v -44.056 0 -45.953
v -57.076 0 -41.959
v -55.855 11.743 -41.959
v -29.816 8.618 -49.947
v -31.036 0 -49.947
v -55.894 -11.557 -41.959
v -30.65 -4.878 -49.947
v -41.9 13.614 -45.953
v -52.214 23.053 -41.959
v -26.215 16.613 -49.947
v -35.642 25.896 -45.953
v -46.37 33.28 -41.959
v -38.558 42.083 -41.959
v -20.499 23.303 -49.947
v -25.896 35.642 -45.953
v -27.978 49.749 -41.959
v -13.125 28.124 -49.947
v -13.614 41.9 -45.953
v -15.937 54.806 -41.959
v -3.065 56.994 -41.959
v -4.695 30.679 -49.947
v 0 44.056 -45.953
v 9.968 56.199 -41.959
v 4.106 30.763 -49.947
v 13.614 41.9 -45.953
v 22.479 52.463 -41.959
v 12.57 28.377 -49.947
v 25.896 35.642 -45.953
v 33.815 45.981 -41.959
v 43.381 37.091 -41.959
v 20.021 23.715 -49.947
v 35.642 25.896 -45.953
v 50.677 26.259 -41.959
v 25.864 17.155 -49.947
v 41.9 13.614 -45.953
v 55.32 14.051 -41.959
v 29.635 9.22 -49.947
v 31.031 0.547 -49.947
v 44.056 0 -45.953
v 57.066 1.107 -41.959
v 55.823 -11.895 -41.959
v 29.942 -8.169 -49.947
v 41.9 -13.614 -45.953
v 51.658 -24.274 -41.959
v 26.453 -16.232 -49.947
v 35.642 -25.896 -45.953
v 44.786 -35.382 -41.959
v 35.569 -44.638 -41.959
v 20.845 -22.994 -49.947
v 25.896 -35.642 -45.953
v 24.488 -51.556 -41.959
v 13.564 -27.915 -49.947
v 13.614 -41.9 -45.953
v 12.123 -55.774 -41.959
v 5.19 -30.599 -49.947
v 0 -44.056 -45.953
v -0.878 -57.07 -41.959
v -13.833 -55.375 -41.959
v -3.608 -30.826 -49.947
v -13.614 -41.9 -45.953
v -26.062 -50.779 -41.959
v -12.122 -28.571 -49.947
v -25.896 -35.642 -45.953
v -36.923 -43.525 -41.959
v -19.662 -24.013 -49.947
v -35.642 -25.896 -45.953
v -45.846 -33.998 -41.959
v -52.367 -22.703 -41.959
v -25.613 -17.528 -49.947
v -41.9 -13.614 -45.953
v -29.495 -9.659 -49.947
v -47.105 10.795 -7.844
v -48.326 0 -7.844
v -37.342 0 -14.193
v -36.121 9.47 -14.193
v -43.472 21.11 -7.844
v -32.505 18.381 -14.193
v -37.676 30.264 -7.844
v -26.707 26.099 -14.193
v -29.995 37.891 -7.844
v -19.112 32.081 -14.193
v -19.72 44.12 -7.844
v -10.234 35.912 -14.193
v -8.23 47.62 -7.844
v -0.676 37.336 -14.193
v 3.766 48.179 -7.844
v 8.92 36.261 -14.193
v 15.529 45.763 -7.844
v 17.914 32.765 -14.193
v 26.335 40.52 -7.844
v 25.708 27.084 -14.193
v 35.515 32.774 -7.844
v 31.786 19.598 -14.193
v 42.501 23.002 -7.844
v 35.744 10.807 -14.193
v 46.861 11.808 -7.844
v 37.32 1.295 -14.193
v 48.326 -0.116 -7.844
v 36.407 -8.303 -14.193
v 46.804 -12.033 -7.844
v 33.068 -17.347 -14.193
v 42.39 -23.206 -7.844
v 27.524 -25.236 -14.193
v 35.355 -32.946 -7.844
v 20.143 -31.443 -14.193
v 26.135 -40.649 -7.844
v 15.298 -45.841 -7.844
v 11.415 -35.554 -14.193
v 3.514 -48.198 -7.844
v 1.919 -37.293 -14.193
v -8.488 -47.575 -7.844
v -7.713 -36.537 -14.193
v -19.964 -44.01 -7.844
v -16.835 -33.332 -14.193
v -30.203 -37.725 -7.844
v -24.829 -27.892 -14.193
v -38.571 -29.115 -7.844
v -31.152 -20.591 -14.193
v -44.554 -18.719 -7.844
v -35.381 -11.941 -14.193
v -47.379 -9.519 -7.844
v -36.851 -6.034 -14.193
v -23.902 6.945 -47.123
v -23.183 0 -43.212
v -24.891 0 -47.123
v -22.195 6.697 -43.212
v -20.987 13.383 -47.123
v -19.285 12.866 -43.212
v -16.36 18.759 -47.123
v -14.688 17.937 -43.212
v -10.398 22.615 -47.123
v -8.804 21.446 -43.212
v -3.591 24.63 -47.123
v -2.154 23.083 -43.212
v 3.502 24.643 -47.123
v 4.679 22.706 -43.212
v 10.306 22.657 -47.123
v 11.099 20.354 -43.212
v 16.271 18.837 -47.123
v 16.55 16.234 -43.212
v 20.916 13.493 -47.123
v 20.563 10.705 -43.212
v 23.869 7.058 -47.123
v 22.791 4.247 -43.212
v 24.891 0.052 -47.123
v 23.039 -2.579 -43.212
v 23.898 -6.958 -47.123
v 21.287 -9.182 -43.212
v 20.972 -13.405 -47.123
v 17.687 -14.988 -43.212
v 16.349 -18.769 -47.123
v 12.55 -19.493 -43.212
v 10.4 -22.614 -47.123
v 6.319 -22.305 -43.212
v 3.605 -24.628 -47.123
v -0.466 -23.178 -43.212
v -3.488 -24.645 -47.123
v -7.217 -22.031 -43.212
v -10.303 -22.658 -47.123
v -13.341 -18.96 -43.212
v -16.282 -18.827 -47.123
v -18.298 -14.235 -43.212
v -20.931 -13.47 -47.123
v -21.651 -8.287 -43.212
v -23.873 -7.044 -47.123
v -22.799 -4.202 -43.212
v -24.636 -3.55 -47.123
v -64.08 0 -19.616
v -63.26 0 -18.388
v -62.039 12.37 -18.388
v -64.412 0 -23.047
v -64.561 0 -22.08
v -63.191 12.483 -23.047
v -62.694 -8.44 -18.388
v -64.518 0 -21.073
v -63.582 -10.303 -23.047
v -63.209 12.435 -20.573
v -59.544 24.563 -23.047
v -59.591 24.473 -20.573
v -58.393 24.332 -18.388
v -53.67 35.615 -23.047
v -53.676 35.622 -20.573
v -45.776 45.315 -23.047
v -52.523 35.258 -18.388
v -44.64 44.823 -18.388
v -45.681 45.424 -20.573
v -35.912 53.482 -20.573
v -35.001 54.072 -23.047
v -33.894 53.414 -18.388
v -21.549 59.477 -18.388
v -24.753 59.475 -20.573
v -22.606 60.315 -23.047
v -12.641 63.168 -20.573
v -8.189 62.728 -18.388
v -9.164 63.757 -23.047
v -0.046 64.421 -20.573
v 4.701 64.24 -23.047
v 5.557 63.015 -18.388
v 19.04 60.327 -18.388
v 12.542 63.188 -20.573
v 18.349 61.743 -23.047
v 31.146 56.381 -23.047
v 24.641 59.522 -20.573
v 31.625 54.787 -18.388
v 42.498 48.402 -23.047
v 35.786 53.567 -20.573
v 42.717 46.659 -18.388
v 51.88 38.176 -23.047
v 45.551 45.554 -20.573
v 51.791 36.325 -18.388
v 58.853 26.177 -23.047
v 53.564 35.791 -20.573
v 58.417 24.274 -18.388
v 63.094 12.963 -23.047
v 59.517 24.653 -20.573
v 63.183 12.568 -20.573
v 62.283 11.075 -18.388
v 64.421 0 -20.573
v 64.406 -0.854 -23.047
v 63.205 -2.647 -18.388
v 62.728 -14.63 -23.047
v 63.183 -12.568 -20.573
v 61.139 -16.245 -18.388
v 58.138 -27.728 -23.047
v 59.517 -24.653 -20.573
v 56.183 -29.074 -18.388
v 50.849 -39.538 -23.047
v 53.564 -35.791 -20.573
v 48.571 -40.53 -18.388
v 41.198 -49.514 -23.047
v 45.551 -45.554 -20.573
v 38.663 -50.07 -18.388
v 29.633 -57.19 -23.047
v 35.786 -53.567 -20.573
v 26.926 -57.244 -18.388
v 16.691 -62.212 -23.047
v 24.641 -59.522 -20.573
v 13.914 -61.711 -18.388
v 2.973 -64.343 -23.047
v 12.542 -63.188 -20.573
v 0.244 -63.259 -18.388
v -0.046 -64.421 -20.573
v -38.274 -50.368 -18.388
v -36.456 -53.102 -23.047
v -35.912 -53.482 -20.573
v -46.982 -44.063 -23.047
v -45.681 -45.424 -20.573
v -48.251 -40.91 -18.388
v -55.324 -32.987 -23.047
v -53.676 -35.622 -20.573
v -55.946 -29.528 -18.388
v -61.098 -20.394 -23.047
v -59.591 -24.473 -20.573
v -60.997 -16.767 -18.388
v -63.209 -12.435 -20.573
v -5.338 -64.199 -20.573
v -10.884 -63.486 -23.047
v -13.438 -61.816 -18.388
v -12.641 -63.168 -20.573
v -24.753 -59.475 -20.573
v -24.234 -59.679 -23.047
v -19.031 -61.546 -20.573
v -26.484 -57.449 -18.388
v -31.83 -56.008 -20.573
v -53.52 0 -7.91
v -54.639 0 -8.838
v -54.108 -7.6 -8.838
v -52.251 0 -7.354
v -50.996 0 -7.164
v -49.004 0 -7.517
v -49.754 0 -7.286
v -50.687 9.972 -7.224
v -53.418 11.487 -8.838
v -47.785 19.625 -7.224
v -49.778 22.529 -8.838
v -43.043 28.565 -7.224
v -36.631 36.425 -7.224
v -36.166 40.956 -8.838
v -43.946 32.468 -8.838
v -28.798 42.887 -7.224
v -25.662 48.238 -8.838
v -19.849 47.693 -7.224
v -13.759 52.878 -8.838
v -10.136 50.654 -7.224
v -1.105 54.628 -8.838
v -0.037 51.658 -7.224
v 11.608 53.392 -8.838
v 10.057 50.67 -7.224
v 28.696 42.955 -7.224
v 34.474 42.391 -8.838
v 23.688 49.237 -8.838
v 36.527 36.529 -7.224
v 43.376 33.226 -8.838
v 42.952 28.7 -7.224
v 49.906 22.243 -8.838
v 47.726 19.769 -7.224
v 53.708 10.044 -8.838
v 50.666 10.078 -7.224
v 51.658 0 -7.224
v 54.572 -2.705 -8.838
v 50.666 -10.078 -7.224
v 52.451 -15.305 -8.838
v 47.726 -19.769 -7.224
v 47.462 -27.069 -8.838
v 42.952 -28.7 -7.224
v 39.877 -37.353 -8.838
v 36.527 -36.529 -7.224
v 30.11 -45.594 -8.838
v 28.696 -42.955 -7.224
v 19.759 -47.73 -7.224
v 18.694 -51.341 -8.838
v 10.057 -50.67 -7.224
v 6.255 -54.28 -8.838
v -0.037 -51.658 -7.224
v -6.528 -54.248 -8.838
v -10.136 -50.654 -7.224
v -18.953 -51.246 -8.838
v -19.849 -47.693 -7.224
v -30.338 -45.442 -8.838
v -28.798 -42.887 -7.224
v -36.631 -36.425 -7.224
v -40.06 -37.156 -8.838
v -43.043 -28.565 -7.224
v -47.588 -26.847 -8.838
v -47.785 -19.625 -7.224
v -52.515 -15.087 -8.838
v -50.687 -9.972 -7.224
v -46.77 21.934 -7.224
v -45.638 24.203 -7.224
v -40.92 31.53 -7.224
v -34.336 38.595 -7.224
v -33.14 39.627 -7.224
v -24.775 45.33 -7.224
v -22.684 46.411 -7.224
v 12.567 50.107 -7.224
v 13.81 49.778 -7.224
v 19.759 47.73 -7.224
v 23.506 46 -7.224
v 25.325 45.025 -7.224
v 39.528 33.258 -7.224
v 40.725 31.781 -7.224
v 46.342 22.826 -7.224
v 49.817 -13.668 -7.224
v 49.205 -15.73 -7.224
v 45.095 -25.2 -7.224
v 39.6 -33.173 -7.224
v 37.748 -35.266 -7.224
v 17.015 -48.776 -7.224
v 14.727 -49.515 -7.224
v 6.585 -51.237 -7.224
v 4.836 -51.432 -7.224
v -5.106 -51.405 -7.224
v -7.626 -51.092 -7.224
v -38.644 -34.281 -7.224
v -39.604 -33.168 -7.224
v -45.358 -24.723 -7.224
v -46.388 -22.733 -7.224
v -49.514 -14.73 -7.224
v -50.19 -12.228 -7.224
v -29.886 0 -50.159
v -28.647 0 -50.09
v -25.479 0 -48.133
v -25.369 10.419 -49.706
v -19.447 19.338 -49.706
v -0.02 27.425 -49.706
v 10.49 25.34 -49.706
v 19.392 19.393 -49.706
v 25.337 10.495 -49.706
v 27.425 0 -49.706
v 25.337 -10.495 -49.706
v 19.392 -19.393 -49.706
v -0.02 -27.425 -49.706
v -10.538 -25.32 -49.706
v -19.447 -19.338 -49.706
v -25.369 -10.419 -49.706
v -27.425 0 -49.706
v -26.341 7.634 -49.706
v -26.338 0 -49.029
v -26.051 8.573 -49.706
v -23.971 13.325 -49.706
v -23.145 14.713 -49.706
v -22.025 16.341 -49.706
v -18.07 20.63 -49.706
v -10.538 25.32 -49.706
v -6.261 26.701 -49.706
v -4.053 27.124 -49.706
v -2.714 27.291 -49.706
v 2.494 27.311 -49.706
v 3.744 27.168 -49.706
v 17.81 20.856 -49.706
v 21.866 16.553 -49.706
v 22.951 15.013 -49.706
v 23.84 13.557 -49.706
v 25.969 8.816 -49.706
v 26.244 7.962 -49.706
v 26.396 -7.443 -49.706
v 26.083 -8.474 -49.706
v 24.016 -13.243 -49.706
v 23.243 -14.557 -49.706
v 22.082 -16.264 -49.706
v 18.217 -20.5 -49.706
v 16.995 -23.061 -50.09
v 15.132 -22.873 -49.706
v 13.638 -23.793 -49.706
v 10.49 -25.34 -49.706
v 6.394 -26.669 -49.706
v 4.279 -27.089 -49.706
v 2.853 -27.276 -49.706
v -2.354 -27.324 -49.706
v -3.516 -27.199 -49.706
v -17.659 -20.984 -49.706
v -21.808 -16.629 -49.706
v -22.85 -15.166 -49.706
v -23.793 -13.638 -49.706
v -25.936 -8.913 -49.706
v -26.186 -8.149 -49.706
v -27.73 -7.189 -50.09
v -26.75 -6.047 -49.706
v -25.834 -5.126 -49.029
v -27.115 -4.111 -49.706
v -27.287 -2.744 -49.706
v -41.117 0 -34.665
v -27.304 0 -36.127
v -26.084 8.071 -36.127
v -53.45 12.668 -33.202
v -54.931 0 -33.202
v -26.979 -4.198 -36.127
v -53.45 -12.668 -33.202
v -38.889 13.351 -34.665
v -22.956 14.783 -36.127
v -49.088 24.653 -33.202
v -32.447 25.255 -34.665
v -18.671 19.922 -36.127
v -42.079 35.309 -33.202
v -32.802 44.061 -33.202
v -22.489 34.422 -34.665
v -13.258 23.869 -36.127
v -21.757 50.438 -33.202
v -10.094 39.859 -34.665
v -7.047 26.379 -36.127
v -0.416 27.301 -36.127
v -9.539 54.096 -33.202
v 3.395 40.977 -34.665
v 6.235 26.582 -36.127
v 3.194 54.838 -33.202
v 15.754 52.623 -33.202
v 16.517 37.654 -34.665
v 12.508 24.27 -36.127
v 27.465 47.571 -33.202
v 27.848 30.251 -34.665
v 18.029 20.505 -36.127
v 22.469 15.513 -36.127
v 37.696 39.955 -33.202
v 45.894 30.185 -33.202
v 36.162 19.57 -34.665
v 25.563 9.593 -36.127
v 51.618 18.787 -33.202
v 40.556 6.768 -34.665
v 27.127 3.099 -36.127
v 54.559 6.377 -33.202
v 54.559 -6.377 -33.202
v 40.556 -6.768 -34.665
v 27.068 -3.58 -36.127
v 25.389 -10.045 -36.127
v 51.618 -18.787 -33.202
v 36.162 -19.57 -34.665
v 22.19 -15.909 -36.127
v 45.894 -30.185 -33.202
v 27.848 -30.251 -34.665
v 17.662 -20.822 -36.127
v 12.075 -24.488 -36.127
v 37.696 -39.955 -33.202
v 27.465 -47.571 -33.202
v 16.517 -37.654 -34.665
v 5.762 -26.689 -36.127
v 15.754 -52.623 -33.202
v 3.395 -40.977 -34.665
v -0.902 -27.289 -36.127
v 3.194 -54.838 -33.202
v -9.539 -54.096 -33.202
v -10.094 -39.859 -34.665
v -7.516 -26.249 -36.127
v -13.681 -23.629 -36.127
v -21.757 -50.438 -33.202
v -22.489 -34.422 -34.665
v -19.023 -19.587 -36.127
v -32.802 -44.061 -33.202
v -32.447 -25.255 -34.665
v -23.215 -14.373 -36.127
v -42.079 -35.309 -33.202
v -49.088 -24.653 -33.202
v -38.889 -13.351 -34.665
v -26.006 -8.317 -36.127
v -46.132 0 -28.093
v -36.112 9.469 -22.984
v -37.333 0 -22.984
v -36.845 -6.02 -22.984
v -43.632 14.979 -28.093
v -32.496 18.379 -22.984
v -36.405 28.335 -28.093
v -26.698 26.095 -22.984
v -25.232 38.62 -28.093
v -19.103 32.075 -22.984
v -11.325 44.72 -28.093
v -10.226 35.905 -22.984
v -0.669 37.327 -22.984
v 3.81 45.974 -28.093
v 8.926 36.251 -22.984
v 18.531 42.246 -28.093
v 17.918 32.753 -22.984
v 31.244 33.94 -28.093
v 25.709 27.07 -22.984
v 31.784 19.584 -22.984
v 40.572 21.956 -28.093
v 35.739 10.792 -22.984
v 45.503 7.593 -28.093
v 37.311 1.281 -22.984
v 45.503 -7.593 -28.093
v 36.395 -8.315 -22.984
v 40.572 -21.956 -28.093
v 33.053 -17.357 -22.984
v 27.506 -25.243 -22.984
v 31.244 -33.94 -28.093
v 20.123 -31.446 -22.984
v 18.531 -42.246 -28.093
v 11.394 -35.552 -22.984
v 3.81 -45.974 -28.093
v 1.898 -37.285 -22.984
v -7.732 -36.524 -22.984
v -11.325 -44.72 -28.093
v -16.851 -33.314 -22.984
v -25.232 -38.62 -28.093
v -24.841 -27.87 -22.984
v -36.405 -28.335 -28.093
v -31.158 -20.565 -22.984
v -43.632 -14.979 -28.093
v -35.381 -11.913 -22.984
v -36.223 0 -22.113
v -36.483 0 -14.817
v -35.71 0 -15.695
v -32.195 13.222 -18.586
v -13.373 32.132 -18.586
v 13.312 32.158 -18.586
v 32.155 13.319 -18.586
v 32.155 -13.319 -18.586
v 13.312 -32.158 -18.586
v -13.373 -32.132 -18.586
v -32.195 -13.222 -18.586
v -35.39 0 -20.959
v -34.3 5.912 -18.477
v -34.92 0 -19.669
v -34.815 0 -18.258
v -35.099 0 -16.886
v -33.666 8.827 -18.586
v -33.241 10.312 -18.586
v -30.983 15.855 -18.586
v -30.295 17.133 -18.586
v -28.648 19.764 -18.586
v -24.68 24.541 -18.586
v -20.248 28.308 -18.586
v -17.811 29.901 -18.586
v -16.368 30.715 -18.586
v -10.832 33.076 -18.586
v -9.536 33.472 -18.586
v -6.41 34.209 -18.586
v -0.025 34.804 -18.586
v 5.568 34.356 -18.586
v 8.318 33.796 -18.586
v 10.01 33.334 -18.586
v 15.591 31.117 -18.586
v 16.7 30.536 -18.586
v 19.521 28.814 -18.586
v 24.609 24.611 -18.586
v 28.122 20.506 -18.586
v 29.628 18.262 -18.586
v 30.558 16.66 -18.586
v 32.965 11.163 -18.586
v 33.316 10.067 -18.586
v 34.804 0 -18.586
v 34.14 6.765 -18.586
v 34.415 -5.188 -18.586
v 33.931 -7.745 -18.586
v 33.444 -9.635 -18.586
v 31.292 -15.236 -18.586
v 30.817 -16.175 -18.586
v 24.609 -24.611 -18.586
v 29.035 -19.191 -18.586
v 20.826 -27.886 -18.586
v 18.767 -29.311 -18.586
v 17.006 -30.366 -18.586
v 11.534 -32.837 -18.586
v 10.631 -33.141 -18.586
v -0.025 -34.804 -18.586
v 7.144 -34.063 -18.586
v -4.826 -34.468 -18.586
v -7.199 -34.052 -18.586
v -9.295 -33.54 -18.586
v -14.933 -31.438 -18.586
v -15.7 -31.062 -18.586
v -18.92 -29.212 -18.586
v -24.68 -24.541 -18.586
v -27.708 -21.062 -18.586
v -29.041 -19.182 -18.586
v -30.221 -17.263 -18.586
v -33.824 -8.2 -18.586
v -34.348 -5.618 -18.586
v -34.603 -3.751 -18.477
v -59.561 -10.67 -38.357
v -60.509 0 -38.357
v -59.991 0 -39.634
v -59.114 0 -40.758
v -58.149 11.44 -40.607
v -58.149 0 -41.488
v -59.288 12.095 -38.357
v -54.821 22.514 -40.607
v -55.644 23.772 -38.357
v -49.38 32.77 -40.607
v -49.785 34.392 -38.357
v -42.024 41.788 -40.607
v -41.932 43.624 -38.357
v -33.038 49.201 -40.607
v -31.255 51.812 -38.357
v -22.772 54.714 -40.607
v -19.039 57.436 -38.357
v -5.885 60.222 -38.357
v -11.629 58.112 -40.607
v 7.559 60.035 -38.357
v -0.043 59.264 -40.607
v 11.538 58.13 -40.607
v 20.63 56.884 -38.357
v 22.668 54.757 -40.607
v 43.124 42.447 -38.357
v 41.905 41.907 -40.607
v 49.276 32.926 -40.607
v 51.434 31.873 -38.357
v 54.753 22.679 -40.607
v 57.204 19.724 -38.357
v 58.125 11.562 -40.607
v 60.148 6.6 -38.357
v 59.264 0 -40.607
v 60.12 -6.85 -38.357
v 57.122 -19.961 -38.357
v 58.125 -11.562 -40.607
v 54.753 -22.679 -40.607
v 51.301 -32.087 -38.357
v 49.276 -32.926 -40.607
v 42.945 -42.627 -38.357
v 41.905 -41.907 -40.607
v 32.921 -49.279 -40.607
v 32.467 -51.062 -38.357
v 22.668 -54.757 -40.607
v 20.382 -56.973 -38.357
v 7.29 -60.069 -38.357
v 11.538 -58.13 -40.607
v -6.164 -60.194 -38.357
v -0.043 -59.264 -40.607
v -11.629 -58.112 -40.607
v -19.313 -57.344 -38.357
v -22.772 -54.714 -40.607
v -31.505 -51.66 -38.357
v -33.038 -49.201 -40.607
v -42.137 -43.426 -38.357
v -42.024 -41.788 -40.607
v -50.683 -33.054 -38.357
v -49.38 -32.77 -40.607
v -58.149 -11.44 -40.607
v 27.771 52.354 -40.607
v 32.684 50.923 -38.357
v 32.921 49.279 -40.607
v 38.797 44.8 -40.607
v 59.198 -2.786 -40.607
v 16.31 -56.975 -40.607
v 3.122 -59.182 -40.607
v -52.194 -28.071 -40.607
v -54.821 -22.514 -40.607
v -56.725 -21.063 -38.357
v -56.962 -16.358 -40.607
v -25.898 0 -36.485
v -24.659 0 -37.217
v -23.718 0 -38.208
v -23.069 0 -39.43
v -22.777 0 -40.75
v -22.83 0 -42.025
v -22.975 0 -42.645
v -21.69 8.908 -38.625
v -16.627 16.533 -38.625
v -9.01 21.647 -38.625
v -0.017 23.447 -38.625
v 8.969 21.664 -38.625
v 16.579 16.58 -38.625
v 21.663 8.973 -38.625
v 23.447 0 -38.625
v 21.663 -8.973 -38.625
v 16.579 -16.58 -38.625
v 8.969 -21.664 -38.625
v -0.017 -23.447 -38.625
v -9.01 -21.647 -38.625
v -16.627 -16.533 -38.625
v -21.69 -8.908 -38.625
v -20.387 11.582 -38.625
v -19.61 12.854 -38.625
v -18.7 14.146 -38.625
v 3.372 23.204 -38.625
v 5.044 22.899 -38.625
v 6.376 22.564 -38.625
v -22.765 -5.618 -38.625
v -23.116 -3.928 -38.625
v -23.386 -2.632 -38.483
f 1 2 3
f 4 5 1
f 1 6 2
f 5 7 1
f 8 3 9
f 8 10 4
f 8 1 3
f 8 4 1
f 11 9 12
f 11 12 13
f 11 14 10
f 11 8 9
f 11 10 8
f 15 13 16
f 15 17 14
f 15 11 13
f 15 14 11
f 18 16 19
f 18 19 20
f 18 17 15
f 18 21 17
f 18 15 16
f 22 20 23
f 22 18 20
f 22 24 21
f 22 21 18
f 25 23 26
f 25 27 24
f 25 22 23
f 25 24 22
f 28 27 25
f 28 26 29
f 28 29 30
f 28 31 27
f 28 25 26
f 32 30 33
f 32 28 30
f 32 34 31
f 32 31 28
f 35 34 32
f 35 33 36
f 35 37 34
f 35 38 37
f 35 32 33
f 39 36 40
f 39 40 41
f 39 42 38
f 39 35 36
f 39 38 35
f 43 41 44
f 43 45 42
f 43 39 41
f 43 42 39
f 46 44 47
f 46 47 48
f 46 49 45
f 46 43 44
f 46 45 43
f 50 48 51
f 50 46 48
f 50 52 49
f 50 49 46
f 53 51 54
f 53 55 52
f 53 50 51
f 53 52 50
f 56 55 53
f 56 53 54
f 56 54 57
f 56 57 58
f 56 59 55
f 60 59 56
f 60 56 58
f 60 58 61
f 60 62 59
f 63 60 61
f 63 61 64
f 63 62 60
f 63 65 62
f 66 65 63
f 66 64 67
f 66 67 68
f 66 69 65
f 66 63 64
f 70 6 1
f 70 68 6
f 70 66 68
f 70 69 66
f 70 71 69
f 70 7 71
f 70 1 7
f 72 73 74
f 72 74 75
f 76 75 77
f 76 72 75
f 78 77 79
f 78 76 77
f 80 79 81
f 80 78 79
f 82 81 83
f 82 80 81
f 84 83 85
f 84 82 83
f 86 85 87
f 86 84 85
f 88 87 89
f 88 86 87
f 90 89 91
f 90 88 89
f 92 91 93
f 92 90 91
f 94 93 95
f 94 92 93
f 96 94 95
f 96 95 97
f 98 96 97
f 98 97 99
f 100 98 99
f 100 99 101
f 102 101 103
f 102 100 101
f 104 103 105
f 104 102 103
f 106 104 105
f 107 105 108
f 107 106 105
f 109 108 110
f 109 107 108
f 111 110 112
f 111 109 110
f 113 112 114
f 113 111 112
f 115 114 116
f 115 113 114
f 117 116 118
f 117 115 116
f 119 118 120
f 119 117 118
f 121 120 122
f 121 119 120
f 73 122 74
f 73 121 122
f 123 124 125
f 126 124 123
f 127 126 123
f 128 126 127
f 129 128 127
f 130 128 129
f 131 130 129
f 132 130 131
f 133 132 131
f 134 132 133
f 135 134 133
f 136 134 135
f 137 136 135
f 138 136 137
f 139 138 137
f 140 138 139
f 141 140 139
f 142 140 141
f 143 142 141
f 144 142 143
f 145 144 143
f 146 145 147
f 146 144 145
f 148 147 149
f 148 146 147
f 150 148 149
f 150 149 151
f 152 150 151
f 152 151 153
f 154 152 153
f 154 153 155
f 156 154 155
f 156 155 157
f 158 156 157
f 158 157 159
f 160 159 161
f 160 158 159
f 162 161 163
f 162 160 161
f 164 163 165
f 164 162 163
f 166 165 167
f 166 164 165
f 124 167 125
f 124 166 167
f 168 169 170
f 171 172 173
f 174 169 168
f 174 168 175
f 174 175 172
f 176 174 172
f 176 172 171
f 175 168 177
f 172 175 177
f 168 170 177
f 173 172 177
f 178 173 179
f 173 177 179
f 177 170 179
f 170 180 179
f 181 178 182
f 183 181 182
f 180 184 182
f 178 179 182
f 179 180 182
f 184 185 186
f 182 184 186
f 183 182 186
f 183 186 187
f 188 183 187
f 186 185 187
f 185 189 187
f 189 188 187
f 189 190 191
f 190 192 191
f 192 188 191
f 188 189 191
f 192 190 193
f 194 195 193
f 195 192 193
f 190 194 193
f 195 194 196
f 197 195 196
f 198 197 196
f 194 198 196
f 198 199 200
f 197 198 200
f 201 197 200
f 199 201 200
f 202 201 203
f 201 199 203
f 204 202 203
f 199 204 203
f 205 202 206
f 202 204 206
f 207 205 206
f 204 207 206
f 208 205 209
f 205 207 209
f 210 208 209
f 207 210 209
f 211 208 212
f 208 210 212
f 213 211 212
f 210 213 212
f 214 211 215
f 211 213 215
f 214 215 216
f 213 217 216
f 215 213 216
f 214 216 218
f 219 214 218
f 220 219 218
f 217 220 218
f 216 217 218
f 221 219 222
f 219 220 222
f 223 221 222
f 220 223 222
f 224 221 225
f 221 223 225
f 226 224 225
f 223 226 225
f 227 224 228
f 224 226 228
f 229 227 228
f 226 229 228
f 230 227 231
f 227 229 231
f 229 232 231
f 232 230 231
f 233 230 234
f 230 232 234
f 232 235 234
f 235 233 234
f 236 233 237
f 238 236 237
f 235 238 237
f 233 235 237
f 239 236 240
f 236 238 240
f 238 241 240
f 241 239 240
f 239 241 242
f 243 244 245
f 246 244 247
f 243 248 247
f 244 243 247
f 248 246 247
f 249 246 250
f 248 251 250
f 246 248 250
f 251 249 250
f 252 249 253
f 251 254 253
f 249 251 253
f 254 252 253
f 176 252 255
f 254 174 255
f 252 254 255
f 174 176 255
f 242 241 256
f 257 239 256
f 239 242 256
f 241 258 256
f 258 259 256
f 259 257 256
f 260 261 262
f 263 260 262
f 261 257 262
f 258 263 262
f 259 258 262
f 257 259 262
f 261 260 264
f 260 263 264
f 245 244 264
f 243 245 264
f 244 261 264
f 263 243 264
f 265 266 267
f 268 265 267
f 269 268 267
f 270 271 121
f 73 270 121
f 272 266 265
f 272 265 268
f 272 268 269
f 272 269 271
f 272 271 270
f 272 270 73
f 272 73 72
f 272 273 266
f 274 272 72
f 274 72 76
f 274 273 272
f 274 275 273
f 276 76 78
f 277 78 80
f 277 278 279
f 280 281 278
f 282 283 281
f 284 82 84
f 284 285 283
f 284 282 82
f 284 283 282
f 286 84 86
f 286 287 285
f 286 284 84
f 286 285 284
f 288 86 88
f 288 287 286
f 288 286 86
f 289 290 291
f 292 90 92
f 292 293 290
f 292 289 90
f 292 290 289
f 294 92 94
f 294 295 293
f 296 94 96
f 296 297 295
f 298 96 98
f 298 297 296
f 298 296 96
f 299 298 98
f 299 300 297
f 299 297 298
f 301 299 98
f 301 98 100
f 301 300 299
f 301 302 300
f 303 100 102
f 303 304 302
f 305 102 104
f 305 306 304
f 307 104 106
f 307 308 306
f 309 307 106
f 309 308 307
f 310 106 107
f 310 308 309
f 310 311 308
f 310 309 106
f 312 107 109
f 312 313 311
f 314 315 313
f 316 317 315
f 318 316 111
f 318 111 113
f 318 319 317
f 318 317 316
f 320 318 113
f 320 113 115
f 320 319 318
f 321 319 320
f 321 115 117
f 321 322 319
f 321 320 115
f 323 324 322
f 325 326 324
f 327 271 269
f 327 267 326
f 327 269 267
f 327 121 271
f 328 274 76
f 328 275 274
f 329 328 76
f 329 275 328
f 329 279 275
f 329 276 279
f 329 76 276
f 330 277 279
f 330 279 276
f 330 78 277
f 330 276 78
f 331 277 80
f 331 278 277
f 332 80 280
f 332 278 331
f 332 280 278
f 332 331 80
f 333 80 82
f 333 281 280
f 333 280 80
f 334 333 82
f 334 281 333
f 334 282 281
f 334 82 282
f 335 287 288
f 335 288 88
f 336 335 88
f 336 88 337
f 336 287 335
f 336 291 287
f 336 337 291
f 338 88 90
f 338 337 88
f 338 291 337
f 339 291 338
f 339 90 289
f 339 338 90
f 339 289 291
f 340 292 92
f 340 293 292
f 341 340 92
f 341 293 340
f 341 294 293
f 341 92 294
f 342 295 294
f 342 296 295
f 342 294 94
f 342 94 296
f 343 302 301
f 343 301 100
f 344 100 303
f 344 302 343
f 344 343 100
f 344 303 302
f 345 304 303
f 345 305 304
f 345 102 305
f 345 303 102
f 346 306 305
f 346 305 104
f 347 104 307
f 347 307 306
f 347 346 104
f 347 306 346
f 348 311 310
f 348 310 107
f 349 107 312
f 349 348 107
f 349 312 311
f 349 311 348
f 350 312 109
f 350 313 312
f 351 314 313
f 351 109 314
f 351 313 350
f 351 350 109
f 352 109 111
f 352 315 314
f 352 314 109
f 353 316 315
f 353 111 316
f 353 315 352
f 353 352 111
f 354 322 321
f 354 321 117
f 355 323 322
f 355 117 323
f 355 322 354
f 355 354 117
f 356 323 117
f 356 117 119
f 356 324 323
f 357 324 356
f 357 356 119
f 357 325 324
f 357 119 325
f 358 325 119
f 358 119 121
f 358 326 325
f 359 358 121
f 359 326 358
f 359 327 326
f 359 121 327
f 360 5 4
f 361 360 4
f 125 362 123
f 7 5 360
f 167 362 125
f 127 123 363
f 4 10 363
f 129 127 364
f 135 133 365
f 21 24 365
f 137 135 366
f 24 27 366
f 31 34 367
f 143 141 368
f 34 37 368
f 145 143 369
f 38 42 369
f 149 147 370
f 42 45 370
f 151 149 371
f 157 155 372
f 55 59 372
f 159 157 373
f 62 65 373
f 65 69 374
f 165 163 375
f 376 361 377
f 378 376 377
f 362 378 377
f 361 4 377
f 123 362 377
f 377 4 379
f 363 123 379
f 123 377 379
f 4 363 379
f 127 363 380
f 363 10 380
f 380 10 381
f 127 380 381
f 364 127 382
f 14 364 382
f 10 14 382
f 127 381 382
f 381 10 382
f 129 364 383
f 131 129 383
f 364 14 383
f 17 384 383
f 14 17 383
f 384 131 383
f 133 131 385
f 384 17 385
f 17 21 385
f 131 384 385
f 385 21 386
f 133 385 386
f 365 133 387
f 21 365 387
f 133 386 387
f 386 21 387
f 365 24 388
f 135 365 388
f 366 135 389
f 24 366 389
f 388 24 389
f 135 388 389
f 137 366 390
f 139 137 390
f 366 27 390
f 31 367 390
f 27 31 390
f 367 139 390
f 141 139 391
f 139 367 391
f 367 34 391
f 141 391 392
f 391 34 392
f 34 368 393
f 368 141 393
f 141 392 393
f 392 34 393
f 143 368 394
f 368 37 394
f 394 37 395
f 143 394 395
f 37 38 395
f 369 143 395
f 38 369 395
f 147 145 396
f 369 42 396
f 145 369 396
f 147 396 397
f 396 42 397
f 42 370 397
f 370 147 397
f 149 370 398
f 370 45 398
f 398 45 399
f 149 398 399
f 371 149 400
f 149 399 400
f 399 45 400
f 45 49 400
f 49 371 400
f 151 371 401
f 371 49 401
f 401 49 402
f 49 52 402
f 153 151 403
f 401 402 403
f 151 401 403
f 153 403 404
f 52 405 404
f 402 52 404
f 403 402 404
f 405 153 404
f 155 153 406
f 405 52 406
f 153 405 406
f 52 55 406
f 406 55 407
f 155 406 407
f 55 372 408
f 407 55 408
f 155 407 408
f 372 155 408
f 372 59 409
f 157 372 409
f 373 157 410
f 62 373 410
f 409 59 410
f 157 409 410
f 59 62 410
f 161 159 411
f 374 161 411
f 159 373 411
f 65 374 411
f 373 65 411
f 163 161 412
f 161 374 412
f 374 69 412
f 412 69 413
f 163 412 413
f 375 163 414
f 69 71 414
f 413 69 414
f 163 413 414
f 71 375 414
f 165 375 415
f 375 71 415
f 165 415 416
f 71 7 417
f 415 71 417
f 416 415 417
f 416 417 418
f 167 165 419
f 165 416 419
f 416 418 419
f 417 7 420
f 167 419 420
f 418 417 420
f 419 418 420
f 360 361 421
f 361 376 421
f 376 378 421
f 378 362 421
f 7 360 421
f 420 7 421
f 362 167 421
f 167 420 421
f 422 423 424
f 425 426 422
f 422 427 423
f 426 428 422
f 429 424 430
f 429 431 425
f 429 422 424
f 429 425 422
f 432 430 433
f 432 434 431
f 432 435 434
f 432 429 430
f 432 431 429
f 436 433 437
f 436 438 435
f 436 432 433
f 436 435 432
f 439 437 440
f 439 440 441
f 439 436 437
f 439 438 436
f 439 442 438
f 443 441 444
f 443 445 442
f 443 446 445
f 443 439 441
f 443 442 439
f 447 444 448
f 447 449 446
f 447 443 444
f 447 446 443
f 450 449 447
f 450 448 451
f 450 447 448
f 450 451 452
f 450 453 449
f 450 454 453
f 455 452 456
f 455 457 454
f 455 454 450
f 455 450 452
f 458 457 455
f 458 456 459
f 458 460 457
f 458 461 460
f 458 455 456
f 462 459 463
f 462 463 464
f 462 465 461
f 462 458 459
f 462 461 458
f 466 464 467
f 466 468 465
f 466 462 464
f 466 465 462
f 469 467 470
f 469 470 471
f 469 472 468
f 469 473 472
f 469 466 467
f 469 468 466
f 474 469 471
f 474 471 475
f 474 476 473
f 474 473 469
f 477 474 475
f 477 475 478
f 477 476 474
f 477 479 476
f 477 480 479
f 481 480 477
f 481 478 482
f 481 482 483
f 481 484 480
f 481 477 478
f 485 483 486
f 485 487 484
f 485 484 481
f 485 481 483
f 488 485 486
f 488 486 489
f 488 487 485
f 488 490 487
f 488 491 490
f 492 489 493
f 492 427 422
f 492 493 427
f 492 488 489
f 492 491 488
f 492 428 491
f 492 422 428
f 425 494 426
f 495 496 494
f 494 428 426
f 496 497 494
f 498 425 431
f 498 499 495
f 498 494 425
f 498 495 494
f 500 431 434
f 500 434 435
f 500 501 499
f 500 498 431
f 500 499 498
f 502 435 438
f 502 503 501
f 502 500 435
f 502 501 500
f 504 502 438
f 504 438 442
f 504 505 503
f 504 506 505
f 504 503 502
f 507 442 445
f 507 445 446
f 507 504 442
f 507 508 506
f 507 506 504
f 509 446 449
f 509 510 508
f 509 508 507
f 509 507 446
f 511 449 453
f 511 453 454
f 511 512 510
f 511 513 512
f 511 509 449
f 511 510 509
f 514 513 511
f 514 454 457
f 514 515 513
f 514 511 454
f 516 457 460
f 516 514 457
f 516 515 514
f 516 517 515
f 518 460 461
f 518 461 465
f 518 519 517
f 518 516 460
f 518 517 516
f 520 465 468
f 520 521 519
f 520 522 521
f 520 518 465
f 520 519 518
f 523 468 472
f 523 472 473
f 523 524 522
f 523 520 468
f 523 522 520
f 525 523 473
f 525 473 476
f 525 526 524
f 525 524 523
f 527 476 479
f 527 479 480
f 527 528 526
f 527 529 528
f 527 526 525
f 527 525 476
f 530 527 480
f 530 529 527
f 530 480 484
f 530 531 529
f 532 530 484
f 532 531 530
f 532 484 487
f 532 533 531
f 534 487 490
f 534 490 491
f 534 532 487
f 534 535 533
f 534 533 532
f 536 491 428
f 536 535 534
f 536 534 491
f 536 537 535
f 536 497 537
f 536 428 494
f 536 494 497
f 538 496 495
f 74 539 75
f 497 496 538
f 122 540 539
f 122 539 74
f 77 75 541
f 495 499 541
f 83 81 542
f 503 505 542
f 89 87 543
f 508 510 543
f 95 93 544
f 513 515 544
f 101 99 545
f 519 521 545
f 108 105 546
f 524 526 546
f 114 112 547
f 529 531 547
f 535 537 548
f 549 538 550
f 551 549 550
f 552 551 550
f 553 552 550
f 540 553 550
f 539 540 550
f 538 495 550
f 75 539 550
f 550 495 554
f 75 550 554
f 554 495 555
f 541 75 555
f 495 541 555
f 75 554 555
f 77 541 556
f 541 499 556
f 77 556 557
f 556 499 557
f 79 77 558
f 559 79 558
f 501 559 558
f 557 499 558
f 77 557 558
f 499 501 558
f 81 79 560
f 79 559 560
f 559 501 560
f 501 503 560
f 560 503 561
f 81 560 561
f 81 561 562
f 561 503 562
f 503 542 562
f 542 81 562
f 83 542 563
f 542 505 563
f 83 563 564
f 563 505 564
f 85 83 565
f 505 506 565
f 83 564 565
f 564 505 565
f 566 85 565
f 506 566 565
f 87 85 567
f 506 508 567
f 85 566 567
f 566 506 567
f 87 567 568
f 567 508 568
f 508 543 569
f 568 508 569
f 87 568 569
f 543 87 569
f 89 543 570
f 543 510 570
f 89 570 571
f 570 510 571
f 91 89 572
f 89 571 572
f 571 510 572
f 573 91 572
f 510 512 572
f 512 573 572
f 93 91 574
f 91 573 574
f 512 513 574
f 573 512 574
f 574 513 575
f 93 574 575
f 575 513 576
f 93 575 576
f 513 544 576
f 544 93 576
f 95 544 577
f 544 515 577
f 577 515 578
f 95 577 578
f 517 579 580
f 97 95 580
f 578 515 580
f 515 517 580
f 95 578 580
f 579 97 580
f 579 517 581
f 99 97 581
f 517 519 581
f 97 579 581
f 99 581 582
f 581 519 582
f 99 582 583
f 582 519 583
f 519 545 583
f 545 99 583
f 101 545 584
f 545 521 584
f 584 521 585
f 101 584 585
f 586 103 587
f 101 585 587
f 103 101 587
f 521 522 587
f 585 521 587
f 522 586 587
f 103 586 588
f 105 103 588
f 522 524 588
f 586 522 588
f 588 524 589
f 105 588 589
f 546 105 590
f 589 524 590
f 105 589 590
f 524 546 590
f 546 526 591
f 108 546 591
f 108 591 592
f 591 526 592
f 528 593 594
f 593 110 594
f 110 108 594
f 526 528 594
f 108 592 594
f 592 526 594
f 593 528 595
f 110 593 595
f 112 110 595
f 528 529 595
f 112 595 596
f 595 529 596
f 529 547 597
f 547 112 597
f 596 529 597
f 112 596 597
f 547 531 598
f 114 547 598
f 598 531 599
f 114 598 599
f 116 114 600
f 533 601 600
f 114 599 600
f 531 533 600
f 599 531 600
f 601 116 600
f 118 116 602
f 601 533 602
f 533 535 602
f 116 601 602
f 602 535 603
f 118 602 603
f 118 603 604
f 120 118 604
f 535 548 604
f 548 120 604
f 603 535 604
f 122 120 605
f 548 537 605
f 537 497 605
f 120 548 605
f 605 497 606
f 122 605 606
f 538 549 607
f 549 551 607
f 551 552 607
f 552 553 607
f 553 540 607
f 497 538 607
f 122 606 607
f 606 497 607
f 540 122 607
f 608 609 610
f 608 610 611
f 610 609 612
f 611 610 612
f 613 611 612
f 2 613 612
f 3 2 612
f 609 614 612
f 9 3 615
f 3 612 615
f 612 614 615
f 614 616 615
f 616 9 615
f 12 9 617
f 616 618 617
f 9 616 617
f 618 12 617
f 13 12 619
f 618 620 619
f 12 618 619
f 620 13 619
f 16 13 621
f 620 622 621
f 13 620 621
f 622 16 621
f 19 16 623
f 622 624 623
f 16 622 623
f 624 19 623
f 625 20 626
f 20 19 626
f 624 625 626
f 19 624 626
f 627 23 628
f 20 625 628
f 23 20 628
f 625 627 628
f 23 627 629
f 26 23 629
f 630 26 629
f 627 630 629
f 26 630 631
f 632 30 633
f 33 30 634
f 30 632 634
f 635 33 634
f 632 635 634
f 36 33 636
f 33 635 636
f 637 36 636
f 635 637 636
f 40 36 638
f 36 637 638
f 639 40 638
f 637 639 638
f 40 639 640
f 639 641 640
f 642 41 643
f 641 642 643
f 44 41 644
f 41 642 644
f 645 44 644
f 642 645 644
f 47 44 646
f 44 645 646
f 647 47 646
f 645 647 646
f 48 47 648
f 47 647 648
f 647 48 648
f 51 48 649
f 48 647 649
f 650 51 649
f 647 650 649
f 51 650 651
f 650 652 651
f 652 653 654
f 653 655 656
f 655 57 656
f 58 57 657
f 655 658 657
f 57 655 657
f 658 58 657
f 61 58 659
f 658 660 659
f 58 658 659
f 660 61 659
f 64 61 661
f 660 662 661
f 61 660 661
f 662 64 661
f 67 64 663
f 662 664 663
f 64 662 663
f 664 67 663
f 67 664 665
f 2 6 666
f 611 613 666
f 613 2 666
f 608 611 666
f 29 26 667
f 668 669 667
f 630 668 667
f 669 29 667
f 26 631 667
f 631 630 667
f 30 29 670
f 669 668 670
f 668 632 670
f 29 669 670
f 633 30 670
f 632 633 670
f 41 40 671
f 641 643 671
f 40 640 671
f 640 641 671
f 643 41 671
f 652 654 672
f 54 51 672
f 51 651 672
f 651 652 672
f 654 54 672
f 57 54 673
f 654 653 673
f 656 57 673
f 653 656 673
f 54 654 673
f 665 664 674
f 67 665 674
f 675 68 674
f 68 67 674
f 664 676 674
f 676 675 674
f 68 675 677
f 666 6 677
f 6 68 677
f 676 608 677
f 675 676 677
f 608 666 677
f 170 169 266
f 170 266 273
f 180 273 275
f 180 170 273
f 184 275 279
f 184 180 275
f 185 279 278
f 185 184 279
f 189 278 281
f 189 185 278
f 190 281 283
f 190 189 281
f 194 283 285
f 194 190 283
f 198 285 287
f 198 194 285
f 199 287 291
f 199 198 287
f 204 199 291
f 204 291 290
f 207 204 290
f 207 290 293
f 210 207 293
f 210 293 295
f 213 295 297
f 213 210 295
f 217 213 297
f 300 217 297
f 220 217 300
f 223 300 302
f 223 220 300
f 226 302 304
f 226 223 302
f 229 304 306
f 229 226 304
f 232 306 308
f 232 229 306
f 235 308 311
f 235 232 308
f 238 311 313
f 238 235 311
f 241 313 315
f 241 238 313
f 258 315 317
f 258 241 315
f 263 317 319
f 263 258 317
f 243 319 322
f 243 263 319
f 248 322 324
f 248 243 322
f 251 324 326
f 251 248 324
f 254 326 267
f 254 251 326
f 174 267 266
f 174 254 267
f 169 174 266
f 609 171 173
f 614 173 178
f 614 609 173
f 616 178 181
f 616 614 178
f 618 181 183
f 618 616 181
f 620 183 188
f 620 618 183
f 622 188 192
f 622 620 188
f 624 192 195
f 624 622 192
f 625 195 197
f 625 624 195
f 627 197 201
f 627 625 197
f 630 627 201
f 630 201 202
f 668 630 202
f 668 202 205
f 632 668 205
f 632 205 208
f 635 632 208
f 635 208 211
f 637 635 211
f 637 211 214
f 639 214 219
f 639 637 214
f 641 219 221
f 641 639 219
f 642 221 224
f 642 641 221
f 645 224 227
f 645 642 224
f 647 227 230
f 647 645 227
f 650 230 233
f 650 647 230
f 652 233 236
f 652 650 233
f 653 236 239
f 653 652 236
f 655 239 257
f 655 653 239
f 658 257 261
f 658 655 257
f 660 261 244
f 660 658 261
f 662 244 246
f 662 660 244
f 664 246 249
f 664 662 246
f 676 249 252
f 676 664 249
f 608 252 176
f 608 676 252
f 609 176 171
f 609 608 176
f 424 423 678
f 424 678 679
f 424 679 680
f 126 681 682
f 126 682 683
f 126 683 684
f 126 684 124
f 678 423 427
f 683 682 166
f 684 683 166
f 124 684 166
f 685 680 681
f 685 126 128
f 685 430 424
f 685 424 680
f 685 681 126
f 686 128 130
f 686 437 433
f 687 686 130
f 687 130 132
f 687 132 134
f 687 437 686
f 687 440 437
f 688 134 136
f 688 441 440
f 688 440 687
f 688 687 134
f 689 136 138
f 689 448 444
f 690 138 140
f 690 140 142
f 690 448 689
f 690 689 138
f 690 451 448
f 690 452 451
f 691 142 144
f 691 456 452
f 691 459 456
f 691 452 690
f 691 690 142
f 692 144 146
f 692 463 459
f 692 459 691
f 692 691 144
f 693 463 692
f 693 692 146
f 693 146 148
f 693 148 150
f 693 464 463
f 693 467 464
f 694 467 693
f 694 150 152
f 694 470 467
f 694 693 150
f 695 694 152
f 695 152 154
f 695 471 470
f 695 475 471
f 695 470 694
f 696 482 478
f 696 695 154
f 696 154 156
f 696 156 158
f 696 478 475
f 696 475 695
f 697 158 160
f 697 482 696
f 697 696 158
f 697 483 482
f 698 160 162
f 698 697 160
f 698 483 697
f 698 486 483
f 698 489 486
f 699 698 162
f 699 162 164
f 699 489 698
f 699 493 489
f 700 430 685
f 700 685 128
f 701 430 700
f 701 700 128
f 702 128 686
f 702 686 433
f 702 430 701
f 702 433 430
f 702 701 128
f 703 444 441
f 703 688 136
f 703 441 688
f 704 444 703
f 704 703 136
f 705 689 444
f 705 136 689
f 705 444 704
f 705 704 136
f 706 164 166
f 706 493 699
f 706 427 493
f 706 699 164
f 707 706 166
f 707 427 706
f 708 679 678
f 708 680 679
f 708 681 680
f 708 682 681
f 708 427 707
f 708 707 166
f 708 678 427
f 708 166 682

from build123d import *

# Parameters (mm, degrees)
F3_R = 5.08
F4_R = 5.08
F5_R = 5.08
F6_R = 5.08
F7_R = 5.08
F8_R = 5.08


with BuildPart() as f2:
    # F0 (on Front) → F2 (revolve)
    with BuildSketch(Plane.XZ):
        Polygon((-51.884659, -5.787526), (-65.084279, -20.408642), (-59.804432, -41.121893), (-26.703846, -51.275443), (-20.408642, -36.8574), (-54.930724, -33.202119), (-29.749911, -18.581003), align=None)
    revolve(axis=Axis((0, 0, -2.335318), (0, 0, -1)))

    # F3
    f3_edges = [f2.edges().sort_by_distance(p)[0] for p in [
        (51.884659, 0, -5.787526),
    ]]
    fillet(f3_edges, radius=F3_R)

    # F4
    f4_edges = [f2.edges().sort_by_distance(p)[0] for p in [
        (65.084279, 0, -20.408642),
    ]]
    fillet(f4_edges, radius=F4_R)

    # F5
    f5_edges = [f2.edges().sort_by_distance(p)[0] for p in [
        (59.804432, 0, -41.121893),
    ]]
    fillet(f5_edges, radius=F5_R)

    # F6
    f6_edges = [f2.edges().sort_by_distance(p)[0] for p in [
        (26.703846, 0, -51.275443),
    ]]
    fillet(f6_edges, radius=F6_R)

    # F7
    f7_edges = [f2.edges().sort_by_distance(p)[0] for p in [
        (29.749911, 0, -18.581003),
    ]]
    fillet(f7_edges, radius=F7_R)

    # F8
    f8_edges = [f2.edges().sort_by_distance(p)[0] for p in [
        (20.408642, 0, -36.8574),
    ]]
    fillet(f8_edges, radius=F8_R)


solid = f2.part
